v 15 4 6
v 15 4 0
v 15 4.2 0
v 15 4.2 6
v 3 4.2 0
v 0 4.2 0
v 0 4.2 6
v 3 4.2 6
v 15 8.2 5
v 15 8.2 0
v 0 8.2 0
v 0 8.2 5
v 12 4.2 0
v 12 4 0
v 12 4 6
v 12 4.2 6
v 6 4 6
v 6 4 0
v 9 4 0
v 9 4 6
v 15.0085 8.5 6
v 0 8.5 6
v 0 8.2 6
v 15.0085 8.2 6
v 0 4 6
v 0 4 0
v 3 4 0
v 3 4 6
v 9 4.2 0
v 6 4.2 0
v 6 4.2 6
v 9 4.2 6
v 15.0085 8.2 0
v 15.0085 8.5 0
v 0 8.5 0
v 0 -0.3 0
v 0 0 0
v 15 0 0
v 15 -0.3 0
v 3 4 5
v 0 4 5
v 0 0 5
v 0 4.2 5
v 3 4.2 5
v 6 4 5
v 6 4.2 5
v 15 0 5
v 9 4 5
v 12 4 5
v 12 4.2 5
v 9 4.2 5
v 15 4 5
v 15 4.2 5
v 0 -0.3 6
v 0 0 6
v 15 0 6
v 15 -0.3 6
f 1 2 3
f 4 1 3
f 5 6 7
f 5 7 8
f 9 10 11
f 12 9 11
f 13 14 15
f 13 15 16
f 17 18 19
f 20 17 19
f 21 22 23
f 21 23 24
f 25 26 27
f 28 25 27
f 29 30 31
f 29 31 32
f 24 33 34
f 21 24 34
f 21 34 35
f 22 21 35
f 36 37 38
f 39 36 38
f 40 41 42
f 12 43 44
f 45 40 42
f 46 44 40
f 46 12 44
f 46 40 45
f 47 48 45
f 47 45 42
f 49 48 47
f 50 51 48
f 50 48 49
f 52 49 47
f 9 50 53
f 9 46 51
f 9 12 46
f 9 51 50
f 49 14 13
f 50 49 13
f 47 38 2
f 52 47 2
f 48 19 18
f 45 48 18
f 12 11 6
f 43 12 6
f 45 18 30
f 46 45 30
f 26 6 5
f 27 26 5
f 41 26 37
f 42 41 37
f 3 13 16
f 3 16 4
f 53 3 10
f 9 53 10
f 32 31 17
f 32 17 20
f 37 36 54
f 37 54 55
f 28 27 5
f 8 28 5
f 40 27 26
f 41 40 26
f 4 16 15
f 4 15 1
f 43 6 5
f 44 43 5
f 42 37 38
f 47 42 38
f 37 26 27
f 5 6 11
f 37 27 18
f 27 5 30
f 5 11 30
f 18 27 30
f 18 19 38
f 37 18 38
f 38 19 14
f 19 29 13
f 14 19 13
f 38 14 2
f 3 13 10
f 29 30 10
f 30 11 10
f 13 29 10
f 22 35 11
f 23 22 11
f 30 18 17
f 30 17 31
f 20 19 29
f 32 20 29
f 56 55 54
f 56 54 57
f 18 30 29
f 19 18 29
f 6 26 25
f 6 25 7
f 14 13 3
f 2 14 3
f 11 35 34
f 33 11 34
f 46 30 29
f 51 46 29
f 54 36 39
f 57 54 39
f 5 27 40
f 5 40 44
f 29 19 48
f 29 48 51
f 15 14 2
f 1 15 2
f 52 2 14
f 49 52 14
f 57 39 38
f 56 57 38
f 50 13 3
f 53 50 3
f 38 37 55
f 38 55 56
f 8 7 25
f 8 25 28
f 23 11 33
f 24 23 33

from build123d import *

# Parameters (mm, degrees)
F0_W     = 3
F0_H     = 0.2
F1_DEPTH = 5
F0_W_2   = 15
F0_H_2   = 0.3
F2_DEPTH = 6


with BuildPart() as f1:
    # F0 (on Top) → F1 (new body)
    with BuildSketch(Plane.XY):
        Polygon((0, 8.2), (0, 4.2), (3, 4.2), (6, 4.2), (9, 4.2), (12, 4.2), (15, 4.2), (15, 8.2), align=None)
        with Locations((4.5, 4.1)):
            Rectangle(F0_W, F0_H)
        Polygon((3, 4), (0, 4), (0, 0), (15, 0), (15, 4), (12, 4), (9, 4), (6, 4), align=None)
        with Locations((10.5, 4.1)):
            Rectangle(F0_W, F0_H)
    extrude(amount=F1_DEPTH)


with BuildPart() as f2:
    # F0 (on Top) → F2 (new body)
    with BuildSketch(Plane.XY):
        Polygon((0, 8.5), (0, 8.2), (15, 8.2), (15.008465, 8.2), (15.008465, 8.5), align=None)
        with Locations((1.5, 4.1)):
            Rectangle(F0_W, F0_H)
        with Locations((7.5, 4.1)):
            Rectangle(F0_W, F0_H)
        with Locations((13.5, 4.1)):
            Rectangle(F0_W, F0_H)
        with Locations((7.5, -0.15)):
            Rectangle(F0_W_2, F0_H_2)
    extrude(amount=F2_DEPTH)


solid = Compound([f1.part, f2.part])
